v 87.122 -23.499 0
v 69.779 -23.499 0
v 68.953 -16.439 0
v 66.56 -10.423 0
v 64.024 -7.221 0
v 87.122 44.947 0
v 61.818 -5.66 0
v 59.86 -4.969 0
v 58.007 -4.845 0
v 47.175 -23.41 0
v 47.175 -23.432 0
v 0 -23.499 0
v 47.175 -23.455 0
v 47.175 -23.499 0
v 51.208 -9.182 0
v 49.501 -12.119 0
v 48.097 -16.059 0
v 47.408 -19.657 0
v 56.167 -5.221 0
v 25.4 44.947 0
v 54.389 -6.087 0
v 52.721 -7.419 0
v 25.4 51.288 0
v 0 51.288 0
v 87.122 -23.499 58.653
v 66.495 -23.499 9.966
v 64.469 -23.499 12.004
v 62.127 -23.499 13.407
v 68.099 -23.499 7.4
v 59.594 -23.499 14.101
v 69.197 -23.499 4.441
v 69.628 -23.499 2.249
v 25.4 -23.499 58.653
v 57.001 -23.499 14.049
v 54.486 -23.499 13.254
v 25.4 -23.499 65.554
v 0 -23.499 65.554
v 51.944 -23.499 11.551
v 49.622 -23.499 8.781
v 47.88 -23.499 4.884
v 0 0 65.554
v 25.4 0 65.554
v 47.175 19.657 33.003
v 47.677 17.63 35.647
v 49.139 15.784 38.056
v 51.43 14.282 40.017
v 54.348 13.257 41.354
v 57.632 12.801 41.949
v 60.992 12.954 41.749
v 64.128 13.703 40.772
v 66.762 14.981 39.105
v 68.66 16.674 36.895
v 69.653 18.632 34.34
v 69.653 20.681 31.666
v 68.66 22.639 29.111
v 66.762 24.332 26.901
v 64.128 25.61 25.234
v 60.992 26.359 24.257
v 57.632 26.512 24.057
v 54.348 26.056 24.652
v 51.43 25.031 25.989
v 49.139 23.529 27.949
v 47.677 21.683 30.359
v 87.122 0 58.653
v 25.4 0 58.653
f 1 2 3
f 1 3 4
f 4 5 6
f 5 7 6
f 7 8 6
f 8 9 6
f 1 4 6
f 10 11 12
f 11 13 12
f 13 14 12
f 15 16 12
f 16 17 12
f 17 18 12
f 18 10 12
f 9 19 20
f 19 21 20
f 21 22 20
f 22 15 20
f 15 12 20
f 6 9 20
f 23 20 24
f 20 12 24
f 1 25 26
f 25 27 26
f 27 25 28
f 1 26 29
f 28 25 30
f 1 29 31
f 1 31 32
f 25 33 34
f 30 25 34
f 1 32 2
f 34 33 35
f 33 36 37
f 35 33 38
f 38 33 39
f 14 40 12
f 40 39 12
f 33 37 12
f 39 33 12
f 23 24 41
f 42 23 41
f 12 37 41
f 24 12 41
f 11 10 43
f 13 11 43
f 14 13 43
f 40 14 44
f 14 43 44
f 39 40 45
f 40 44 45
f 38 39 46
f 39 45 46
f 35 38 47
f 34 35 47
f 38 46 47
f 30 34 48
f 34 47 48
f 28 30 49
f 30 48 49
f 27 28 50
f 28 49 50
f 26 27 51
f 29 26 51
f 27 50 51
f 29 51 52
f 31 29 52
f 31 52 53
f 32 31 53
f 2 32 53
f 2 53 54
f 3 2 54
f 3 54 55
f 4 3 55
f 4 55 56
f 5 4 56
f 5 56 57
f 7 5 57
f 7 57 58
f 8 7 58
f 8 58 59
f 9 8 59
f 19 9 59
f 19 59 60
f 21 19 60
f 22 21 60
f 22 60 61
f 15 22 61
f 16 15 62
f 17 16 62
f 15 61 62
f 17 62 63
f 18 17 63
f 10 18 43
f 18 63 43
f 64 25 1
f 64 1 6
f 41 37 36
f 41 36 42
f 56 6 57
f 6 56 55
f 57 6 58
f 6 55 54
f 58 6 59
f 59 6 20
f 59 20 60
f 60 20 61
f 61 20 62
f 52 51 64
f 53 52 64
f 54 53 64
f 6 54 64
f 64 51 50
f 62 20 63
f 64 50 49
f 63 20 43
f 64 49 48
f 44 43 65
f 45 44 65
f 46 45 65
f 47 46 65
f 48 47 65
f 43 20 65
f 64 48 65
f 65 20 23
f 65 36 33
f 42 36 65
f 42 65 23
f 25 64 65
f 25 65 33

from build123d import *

# Parameters (mm, degrees)
F0_W     = 23.4994404018
F0_H     = 65.5540376902
F1_DEPTH = 25.4
F3_DEPTH = 61.722
F4_R     = 11.3020166748
F5_DEPTH = 63.754


with BuildPart() as f1:
    # F0 (on Right) → F1 (new body)
    with BuildSketch(Plane.YZ):
        Polygon((0, 65.5540376902), (0, 0), (51.2884631753, 0), align=None)
        with Locations((-11.7497202009, 32.7770188451)):
            Rectangle(F0_W, F0_H)
    extrude(amount=F1_DEPTH)

    # F2 (on face) → F3 (join)
    with BuildSketch(Plane.YZ.offset(25.4)):
        Polygon((0, 58.6534105241), (-23.4994404018, 58.6534105241), (-23.4994404018, 0), (44.9473448098, 0), align=None)
    extrude(amount=F3_DEPTH)

    # F4 (on face) → F5 (cut)
    with BuildSketch(Plane(origin=(0, 28.3177833218, 21.7005142555), x_dir=(-1, 0, 0), z_dir=(0, 0.7937387929, 0.6082587678))):
        with Locations((-58.4767535329, 14.2394453287)):
            Circle(F4_R)
    extrude(amount=-F5_DEPTH, mode=Mode.SUBTRACT)


solid = f1.part
